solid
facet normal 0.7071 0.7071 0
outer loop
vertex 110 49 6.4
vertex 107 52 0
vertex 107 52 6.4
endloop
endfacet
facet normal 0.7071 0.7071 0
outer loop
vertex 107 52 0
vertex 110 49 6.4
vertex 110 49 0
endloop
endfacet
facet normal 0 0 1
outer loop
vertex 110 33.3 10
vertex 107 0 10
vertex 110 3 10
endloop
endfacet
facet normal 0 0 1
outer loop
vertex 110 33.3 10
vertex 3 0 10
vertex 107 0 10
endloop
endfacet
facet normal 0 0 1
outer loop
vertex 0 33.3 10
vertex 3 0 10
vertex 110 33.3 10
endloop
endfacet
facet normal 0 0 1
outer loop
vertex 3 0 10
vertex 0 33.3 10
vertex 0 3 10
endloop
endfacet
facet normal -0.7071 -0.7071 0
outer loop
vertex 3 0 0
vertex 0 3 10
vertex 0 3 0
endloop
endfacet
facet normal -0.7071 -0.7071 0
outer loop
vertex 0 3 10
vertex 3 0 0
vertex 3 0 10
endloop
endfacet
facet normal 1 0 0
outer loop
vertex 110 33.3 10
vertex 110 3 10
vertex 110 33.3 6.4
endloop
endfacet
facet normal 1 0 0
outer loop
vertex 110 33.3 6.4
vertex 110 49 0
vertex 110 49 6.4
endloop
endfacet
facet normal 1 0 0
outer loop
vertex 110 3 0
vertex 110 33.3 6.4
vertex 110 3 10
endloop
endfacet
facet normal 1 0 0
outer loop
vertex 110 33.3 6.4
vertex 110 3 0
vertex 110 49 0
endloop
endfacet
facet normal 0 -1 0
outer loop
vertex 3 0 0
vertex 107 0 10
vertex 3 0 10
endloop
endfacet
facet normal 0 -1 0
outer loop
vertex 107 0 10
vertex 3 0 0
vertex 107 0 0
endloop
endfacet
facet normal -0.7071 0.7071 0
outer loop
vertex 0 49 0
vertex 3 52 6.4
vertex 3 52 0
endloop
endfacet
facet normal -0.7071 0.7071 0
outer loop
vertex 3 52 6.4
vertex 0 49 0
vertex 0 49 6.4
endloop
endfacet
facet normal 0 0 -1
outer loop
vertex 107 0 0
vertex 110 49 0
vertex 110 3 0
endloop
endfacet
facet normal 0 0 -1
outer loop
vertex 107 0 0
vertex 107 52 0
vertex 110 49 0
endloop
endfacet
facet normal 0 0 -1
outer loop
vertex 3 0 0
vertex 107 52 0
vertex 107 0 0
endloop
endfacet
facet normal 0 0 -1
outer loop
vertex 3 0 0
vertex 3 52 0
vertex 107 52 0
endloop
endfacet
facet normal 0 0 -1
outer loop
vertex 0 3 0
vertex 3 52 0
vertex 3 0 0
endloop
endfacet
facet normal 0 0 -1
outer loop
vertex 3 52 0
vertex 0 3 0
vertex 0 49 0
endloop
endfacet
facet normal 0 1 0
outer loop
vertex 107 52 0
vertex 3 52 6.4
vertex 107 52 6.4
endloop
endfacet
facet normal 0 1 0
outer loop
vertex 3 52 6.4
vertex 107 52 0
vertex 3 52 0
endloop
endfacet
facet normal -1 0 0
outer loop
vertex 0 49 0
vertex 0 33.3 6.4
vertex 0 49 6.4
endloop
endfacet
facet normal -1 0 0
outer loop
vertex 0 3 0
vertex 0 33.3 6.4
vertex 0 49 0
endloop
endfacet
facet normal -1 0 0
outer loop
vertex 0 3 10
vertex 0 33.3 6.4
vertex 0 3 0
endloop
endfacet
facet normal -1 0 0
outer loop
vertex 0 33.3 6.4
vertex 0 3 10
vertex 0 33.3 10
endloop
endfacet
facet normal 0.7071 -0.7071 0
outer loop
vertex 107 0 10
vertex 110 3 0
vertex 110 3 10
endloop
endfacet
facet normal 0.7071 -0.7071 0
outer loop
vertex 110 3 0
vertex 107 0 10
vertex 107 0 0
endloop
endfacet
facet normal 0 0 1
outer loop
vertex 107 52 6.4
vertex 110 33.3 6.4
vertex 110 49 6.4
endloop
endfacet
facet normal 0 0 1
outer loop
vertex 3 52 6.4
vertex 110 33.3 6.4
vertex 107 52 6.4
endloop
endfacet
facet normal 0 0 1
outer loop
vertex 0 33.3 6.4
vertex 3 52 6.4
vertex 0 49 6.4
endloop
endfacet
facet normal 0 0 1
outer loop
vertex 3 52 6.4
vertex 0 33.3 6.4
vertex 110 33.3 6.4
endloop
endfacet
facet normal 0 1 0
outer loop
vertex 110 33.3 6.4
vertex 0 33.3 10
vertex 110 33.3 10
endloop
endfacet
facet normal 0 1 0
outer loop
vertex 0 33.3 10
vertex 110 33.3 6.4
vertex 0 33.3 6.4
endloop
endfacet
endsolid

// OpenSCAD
$fn = 32;

// ----------------------------------------------------------------------
// Stepped bar: sidestep, 110 x 52 x 10/6.4 mm
// ----------------------------------------------------------------------

// --- parameters (mm) ---
bar_l = 110;              // bar length, X
bar_w = 52;               // bar width, Y
plate_t = 10;             // thickness of the thick zone, Z
thin_t = 6.4;             // thickness of the thin zone
corner_c = 3;             // corner chamfer of the bar
step_cut = 3.6;           // material removed from the thin zone
ledge_y = 33.3;           // start of the ledge from the front edge
depth_1 = 3.6;            // depth of cut 1 from the top face

profile = [[3, 0], [107, 0], [110, 3], [110, 49], [107, 52], [3, 52], [0, 49], [0, 3]];  // primary outline, 8 points, counter clockwise
void_1 = [[-1, 33.3], [111, 33.3], [111, 53], [-1, 53]];  // ledge cut along one edge, 4 points

// --- the one profile operation ---
difference() {
  linear_extrude(height = plate_t) polygon(points = profile);
  translate([0, 0, plate_t - depth_1])
    linear_extrude(height = depth_1 + 1) polygon(points = void_1);
}
